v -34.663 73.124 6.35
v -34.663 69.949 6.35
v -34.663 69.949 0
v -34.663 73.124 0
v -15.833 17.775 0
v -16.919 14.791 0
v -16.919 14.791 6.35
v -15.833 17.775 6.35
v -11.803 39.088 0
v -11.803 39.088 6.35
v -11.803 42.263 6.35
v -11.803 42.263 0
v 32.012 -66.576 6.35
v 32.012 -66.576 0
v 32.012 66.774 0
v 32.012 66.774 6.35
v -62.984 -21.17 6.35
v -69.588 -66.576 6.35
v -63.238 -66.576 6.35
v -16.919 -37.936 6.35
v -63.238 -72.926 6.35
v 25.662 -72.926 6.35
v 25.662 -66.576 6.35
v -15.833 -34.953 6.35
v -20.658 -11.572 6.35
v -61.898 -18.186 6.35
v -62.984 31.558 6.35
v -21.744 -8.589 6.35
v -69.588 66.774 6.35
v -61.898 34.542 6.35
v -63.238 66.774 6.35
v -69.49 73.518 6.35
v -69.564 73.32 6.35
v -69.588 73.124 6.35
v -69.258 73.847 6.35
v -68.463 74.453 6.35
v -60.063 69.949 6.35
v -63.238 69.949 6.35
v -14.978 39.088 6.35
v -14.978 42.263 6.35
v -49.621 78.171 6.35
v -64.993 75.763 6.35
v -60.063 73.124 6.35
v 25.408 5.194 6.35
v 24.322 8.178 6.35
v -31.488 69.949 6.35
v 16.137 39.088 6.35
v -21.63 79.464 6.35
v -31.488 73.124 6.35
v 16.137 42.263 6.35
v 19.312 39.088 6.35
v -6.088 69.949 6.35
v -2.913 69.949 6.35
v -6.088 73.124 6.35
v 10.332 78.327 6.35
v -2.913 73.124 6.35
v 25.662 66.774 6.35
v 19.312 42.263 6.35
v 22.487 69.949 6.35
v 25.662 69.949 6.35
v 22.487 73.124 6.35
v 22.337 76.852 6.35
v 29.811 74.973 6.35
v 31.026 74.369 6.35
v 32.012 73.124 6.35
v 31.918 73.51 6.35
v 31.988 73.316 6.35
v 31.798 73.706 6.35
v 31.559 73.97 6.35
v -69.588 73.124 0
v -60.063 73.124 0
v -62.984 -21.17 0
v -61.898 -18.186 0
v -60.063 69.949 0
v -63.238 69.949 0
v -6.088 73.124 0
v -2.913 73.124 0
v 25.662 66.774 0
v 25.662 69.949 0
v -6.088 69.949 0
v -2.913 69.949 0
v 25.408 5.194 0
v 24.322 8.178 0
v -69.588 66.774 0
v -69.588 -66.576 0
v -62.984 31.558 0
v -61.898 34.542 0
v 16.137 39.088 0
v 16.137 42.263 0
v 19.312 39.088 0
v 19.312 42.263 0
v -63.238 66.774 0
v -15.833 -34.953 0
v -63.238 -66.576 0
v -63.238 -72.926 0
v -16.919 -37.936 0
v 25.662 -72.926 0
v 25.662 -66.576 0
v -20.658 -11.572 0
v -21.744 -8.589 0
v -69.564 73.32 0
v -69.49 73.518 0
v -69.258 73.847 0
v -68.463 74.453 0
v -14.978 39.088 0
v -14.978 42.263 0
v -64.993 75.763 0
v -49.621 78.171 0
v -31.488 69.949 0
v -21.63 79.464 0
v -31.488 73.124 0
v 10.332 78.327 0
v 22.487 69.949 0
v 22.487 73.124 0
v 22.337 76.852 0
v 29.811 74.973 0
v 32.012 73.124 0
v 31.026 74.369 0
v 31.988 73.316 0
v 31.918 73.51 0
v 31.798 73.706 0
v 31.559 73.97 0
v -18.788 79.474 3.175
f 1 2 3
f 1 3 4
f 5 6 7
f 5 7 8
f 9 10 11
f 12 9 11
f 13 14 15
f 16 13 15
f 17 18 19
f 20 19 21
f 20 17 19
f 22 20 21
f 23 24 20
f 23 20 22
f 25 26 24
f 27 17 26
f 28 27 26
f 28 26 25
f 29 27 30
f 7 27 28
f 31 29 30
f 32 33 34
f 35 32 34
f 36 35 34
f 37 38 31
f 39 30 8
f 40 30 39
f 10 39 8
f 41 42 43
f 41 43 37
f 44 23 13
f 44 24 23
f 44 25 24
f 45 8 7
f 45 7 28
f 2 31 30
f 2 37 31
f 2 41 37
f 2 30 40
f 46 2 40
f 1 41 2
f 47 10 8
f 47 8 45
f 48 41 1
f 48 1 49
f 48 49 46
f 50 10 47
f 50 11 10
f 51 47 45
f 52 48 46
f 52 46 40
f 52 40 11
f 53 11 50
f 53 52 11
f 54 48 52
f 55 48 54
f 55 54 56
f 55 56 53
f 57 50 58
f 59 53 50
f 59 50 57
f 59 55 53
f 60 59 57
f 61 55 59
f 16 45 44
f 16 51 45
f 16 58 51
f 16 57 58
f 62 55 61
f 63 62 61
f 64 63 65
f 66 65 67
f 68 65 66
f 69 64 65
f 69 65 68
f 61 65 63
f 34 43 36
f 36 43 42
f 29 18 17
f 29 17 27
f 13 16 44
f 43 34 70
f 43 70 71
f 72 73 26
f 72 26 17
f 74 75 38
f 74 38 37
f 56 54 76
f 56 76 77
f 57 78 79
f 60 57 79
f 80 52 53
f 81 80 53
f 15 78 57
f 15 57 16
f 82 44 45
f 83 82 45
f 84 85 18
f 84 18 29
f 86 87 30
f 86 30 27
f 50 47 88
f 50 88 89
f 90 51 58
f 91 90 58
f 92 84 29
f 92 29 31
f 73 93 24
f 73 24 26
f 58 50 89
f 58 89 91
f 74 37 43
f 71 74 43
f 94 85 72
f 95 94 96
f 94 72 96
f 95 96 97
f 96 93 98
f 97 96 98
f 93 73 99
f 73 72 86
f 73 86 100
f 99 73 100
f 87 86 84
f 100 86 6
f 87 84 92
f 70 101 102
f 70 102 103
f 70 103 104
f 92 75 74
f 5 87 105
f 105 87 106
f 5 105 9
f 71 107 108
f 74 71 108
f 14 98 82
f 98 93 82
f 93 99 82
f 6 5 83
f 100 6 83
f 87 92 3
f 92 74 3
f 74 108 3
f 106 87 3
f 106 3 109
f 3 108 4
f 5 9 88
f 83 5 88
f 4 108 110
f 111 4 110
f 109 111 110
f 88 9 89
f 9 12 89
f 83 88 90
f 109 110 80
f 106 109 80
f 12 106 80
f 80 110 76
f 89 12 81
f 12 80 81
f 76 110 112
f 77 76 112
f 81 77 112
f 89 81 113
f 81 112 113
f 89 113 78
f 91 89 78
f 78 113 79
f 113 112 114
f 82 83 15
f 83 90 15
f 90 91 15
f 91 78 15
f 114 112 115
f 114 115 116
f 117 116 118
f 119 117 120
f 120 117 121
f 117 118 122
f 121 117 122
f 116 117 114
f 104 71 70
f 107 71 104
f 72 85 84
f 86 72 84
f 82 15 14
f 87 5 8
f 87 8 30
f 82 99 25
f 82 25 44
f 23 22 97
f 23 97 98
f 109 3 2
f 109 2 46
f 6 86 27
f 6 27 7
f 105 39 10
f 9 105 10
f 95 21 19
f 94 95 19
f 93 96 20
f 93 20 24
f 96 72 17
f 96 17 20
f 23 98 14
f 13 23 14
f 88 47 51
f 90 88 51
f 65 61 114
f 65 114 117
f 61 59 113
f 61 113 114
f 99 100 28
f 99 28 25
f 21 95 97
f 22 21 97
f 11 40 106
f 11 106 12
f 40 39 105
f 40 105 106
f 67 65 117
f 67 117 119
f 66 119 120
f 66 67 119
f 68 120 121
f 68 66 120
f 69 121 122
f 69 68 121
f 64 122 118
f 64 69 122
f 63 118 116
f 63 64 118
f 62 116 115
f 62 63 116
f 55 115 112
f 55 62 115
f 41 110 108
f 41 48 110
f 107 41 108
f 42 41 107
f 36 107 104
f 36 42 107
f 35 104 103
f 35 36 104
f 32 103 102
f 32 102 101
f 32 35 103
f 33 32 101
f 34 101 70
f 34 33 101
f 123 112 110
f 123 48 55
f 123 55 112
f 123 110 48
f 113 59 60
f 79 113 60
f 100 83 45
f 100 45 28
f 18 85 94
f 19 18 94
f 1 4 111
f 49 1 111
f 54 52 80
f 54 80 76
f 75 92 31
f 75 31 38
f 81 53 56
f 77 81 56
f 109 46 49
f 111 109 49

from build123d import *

# Parameters (mm, degrees)
F0_W      = 101.6
F0_H      = 146.05
F1_DEPTH  = 6.35
F3_DEPTH  = 6.35
F4_W      = 6.35
F4_H      = 6.35
F5_DEPTH  = 6.3510001
F6_W      = 3.175
F6_H      = 3.175
F7_DEPTH  = 6.3510001
F9_DEPTH  = 18.288
F11_DEPTH = 25.654
F13_DEPTH = 37.846


with BuildPart() as f1:
    # F0 (on Top) → F1 (new body)
    with BuildSketch(Plane.XY):
        with Locations((-18.788338281, 0.0990834087)):
            Rectangle(F0_W, F0_H)
    extrude(amount=F1_DEPTH)

    # F2 (on face) → F3 (join)
    with BuildSketch(Plane.XY.offset(6.35)):
        with BuildLine():
            add(Edge.make_bspline(
                [(-18.788338281, 79.4740834087), (-69.588338281, 79.4740834087), (-69.588338281, 73.1240834087)],
                knots=[4.7123889804, 4.7123889804, 4.7123889804, 6.2831853072, 6.2831853072, 6.2831853072], degree=2, weights=[1, 0.7071067812, 1]))
            Line((-69.588338281, 73.1240834087), (-18.788338281, 73.1240834087))
            Line((-18.788338281, 73.1240834087), (-18.788338281, 79.4740834087))
        make_face()
        with BuildLine():
            Line((-18.788338281, 79.4740834087), (-18.788338281, 73.1240834087))
            Line((-18.788338281, 73.1240834087), (32.011661719, 73.1240834087))
            add(Edge.make_bspline(
                [(32.011661719, 73.1240834087), (32.011661719, 79.4740834087), (-18.788338281, 79.4740834087)],
                knots=[3.1415926536, 3.1415926536, 3.1415926536, 4.7123889804, 4.7123889804, 4.7123889804], degree=2, weights=[1, 0.7071067812, 1]))
        make_face()
    extrude(amount=-F3_DEPTH)

    # F4 (on face) → F5 (cut, through all)
    with BuildSketch(Plane.XY.offset(6.35)):
        with Locations((-66.413338281, 69.9490834087)):
            Rectangle(F4_W, F4_H)
        with Locations((28.836661719, 69.9490834087)):
            Rectangle(F4_W, F4_H)
        with Locations((28.836661719, -69.7509165913)):
            Rectangle(F4_W, F4_H)
        with Locations((-66.413338281, -69.7509165913)):
            Rectangle(F4_W, F4_H)
    extrude(amount=-F5_DEPTH, mode=Mode.SUBTRACT)

    # F6 (on face) → F7 (cut, through all)
    with BuildSketch(Plane.XY.offset(6.35)):
        with Locations((-61.650838281, 71.5365834087)):
            Rectangle(F6_W, F6_H)
        with Locations((-33.075838281, 71.5365834087)):
            Rectangle(F6_W, F6_H)
        with Locations((-4.500838281, 71.5365834087)):
            Rectangle(F6_W, F6_H)
        with Locations((24.074161719, 71.5365834087)):
            Rectangle(F6_W, F6_H)
        with Locations((17.724161719, 40.6755834087)):
            Rectangle(F6_W, F6_H)
        with Locations((-13.390838281, 40.6755834087)):
            Rectangle(F6_W, F6_H)
    extrude(amount=-F7_DEPTH, mode=Mode.SUBTRACT)

    # F8 (on Top) → F9 (cut)
    with BuildSketch(Plane.XY):
        Polygon((-61.8984243259, 34.5415057816), (-62.984338281, 31.5579817106), (-16.9187266248, 14.7914702445), (-15.8328126697, 17.7749943155), align=None)
    extrude(amount=F9_DEPTH, mode=Mode.SUBTRACT)

    # F10 (on Top) → F11 (cut)
    with BuildSketch(Plane.XY):
        Polygon((24.321747764, 8.1776830323), (-21.7438638922, -8.5888284338), (-20.6579499371, -11.5723525048), (25.407661719, 5.1941589613), align=None)
    extrude(amount=F11_DEPTH, mode=Mode.SUBTRACT)

    # F12 (on Top) → F13 (cut)
    with BuildSketch(Plane.XY):
        Polygon((-15.8328126697, -34.9526511831), (-61.8984243259, -18.186139717), (-62.984338281, -21.169663788), (-16.9187266248, -37.9361752541), align=None)
    extrude(amount=F13_DEPTH, mode=Mode.SUBTRACT)


solid = f1.part
